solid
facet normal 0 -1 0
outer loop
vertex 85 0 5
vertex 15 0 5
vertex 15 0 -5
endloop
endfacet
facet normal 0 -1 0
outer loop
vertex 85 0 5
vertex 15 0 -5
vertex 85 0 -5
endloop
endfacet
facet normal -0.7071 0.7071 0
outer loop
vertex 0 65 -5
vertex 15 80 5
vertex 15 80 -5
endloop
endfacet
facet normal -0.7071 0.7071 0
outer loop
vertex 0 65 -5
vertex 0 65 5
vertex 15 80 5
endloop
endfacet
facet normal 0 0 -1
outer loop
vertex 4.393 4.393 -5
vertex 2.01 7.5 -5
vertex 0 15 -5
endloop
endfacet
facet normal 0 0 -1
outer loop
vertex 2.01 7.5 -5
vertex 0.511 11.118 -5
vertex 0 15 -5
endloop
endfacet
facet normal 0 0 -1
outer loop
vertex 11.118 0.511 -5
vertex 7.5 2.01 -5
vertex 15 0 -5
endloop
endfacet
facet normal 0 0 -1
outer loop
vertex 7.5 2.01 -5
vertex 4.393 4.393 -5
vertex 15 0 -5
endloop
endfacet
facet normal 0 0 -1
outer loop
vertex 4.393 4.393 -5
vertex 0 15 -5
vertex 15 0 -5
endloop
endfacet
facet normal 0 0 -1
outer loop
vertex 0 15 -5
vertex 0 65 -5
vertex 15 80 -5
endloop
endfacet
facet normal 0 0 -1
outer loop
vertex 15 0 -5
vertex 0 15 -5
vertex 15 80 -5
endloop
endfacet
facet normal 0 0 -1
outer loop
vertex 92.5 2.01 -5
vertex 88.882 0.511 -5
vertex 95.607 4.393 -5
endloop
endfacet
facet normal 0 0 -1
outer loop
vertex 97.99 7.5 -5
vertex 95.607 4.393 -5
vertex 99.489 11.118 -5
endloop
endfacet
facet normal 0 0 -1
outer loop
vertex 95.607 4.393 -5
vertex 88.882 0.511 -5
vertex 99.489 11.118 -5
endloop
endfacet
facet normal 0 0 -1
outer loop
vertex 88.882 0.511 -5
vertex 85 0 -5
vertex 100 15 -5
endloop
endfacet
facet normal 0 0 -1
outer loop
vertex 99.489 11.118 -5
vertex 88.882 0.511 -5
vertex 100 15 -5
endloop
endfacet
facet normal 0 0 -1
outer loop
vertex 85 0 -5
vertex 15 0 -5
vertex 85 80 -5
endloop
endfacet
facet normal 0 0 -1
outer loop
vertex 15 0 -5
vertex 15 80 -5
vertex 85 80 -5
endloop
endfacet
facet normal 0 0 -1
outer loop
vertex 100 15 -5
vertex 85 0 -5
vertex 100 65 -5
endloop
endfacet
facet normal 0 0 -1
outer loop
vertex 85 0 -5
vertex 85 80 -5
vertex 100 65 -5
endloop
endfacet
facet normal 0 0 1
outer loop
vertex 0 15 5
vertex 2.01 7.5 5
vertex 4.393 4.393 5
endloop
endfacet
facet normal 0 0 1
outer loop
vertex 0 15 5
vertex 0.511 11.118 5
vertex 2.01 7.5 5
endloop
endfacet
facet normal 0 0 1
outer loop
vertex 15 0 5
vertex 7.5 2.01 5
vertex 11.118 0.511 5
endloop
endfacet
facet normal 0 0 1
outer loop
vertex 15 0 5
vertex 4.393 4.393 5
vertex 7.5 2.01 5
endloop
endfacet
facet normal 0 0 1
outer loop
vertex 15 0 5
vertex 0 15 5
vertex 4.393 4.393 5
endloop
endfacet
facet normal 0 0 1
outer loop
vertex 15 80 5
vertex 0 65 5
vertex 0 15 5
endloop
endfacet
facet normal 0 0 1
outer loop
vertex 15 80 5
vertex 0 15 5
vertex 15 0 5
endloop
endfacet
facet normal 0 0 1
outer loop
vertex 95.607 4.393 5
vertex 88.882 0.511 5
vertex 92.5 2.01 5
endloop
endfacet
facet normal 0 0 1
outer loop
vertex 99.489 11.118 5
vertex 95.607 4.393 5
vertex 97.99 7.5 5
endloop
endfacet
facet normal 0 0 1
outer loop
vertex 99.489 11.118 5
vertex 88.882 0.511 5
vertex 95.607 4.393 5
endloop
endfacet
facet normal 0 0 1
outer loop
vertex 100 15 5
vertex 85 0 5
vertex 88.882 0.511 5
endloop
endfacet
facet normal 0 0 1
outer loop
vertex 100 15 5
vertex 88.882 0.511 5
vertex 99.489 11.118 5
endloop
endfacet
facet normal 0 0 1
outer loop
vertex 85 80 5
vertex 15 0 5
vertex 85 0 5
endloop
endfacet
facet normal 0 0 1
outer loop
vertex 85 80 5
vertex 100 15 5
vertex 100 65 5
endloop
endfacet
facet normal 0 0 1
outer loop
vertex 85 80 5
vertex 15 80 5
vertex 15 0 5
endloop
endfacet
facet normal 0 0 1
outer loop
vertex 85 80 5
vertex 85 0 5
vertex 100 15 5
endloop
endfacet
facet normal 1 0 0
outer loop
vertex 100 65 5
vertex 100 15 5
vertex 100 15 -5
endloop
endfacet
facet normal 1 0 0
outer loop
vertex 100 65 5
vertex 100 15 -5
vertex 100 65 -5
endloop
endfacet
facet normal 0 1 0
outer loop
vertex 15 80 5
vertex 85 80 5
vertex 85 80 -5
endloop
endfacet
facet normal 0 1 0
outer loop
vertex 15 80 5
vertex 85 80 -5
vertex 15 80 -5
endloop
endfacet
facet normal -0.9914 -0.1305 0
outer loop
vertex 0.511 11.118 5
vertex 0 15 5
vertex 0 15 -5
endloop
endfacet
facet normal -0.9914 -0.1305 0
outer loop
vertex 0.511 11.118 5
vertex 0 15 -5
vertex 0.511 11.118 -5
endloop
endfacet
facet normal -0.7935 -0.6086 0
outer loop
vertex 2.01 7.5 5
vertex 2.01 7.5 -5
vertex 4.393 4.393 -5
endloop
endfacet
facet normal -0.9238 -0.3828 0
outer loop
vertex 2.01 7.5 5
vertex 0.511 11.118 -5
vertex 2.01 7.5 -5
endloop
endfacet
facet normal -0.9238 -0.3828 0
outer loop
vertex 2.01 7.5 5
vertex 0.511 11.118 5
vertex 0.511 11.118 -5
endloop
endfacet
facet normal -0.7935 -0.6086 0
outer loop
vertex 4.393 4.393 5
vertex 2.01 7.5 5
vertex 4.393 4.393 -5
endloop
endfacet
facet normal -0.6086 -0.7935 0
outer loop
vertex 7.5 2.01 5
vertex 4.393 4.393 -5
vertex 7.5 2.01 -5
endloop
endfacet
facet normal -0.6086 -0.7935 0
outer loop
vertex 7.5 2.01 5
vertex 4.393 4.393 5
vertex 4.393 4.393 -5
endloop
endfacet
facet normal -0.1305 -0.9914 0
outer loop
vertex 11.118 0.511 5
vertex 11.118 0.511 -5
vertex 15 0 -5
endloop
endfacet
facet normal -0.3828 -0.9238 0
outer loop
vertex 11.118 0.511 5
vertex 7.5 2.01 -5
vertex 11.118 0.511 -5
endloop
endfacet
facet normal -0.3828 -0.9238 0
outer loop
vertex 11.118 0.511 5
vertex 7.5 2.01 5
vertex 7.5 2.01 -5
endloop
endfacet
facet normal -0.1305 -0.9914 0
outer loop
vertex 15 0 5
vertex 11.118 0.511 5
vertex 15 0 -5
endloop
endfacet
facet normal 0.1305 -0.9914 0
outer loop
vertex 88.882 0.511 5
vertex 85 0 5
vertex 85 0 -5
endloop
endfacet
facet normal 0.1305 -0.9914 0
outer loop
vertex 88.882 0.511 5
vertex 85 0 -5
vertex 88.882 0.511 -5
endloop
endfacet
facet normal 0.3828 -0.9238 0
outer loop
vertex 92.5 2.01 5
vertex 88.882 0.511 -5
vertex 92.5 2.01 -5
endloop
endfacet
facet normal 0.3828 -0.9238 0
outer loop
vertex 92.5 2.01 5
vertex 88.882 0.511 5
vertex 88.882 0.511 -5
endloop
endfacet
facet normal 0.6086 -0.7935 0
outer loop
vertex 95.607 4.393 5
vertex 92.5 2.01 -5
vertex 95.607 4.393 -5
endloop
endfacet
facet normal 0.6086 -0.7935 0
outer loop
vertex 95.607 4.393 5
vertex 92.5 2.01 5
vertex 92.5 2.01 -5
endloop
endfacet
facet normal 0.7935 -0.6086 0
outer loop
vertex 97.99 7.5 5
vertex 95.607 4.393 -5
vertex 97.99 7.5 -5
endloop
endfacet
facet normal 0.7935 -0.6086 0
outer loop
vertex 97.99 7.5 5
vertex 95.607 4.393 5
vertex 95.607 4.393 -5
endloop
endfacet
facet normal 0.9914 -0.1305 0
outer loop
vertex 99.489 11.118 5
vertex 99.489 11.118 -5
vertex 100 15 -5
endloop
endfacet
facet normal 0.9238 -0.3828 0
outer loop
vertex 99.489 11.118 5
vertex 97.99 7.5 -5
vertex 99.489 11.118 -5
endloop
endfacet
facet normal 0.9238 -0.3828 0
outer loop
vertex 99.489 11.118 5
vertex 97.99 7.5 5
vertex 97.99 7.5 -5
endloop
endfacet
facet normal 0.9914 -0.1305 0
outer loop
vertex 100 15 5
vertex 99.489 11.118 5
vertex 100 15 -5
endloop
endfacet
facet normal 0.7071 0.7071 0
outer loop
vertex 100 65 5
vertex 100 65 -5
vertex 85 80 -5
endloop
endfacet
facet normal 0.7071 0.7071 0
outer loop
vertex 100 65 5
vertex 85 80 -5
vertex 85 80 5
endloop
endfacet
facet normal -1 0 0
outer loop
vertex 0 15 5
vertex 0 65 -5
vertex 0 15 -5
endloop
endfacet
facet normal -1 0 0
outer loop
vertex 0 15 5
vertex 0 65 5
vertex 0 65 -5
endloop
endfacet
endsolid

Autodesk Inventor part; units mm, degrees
ref_plane "YZ Plane" through (0, 0, 0) normal (1, 0, 0) x (0, 1, 0)
ref_plane "XZ Plane" through (0, 0, 0) normal (0, 1, 0) x (-1, 0, 0)
ref_plane "XY Plane" through (0, 0, 0) normal (0, 0, 1) x (1, 0, 0)
sketch "Sketch1" plane through (0, 0, 0) normal (0, 0, 1) x (1, 0, 0)
  line L0 (0, 0) -> (100, 0)
  line L1 (100, 0) -> (100, 80)
  line L2 (100, 80) -> (0, 80)
  line L3 (0, 80) -> (0, 0)
  circle A0 centre (15, 15) radius 5
  circle A1 centre (85, 15) radius 5
  circle A2 centre (85, 65) radius 5
  circle A3 centre (15, 65) radius 5
  dimension "d0" = 100
  dimension "d1" = 80
  dimension "d12" = 10
  dimension "d13" = 10
  dimension "d14" = 10
  dimension "d15" = 10
  dimension "d17" = 15
  dimension "d18" = 15
  dimension "d19" = 15
  dimension "d20" = 15
  dimension "d21" = 15
  dimension "d22" = 15
  dimension "d23" = 15
  dimension "d24" = 15
extrude "Extrusion1" add sketch "Sketch1" along normal mid plane 10 contours L3 L2 L1 L0 | A0 | A1 | A2 | A3
sketch "Sketch2" plane through (0, 0, 5) normal (0, 0, 1) x (1, 0, 0)
  point P0 (0, 0)
chamfer "Chamfer1" distance 15 angle 45 1 edges at (100, 80, 0)
chamfer "Chamfer2" distance 15 angle 45 1 edges at (0, 80, 0)
fillet "Fillet1" radius 15 1 edges at (100, 0, 0)
fillet "Fillet2" radius 15 1 edges at (0, 0, 0)
sketch "Sketch3" plane through (0, 0, 5) normal (0, 0, 1) x (1, 0, 0)
  point P0 (0, 0)
